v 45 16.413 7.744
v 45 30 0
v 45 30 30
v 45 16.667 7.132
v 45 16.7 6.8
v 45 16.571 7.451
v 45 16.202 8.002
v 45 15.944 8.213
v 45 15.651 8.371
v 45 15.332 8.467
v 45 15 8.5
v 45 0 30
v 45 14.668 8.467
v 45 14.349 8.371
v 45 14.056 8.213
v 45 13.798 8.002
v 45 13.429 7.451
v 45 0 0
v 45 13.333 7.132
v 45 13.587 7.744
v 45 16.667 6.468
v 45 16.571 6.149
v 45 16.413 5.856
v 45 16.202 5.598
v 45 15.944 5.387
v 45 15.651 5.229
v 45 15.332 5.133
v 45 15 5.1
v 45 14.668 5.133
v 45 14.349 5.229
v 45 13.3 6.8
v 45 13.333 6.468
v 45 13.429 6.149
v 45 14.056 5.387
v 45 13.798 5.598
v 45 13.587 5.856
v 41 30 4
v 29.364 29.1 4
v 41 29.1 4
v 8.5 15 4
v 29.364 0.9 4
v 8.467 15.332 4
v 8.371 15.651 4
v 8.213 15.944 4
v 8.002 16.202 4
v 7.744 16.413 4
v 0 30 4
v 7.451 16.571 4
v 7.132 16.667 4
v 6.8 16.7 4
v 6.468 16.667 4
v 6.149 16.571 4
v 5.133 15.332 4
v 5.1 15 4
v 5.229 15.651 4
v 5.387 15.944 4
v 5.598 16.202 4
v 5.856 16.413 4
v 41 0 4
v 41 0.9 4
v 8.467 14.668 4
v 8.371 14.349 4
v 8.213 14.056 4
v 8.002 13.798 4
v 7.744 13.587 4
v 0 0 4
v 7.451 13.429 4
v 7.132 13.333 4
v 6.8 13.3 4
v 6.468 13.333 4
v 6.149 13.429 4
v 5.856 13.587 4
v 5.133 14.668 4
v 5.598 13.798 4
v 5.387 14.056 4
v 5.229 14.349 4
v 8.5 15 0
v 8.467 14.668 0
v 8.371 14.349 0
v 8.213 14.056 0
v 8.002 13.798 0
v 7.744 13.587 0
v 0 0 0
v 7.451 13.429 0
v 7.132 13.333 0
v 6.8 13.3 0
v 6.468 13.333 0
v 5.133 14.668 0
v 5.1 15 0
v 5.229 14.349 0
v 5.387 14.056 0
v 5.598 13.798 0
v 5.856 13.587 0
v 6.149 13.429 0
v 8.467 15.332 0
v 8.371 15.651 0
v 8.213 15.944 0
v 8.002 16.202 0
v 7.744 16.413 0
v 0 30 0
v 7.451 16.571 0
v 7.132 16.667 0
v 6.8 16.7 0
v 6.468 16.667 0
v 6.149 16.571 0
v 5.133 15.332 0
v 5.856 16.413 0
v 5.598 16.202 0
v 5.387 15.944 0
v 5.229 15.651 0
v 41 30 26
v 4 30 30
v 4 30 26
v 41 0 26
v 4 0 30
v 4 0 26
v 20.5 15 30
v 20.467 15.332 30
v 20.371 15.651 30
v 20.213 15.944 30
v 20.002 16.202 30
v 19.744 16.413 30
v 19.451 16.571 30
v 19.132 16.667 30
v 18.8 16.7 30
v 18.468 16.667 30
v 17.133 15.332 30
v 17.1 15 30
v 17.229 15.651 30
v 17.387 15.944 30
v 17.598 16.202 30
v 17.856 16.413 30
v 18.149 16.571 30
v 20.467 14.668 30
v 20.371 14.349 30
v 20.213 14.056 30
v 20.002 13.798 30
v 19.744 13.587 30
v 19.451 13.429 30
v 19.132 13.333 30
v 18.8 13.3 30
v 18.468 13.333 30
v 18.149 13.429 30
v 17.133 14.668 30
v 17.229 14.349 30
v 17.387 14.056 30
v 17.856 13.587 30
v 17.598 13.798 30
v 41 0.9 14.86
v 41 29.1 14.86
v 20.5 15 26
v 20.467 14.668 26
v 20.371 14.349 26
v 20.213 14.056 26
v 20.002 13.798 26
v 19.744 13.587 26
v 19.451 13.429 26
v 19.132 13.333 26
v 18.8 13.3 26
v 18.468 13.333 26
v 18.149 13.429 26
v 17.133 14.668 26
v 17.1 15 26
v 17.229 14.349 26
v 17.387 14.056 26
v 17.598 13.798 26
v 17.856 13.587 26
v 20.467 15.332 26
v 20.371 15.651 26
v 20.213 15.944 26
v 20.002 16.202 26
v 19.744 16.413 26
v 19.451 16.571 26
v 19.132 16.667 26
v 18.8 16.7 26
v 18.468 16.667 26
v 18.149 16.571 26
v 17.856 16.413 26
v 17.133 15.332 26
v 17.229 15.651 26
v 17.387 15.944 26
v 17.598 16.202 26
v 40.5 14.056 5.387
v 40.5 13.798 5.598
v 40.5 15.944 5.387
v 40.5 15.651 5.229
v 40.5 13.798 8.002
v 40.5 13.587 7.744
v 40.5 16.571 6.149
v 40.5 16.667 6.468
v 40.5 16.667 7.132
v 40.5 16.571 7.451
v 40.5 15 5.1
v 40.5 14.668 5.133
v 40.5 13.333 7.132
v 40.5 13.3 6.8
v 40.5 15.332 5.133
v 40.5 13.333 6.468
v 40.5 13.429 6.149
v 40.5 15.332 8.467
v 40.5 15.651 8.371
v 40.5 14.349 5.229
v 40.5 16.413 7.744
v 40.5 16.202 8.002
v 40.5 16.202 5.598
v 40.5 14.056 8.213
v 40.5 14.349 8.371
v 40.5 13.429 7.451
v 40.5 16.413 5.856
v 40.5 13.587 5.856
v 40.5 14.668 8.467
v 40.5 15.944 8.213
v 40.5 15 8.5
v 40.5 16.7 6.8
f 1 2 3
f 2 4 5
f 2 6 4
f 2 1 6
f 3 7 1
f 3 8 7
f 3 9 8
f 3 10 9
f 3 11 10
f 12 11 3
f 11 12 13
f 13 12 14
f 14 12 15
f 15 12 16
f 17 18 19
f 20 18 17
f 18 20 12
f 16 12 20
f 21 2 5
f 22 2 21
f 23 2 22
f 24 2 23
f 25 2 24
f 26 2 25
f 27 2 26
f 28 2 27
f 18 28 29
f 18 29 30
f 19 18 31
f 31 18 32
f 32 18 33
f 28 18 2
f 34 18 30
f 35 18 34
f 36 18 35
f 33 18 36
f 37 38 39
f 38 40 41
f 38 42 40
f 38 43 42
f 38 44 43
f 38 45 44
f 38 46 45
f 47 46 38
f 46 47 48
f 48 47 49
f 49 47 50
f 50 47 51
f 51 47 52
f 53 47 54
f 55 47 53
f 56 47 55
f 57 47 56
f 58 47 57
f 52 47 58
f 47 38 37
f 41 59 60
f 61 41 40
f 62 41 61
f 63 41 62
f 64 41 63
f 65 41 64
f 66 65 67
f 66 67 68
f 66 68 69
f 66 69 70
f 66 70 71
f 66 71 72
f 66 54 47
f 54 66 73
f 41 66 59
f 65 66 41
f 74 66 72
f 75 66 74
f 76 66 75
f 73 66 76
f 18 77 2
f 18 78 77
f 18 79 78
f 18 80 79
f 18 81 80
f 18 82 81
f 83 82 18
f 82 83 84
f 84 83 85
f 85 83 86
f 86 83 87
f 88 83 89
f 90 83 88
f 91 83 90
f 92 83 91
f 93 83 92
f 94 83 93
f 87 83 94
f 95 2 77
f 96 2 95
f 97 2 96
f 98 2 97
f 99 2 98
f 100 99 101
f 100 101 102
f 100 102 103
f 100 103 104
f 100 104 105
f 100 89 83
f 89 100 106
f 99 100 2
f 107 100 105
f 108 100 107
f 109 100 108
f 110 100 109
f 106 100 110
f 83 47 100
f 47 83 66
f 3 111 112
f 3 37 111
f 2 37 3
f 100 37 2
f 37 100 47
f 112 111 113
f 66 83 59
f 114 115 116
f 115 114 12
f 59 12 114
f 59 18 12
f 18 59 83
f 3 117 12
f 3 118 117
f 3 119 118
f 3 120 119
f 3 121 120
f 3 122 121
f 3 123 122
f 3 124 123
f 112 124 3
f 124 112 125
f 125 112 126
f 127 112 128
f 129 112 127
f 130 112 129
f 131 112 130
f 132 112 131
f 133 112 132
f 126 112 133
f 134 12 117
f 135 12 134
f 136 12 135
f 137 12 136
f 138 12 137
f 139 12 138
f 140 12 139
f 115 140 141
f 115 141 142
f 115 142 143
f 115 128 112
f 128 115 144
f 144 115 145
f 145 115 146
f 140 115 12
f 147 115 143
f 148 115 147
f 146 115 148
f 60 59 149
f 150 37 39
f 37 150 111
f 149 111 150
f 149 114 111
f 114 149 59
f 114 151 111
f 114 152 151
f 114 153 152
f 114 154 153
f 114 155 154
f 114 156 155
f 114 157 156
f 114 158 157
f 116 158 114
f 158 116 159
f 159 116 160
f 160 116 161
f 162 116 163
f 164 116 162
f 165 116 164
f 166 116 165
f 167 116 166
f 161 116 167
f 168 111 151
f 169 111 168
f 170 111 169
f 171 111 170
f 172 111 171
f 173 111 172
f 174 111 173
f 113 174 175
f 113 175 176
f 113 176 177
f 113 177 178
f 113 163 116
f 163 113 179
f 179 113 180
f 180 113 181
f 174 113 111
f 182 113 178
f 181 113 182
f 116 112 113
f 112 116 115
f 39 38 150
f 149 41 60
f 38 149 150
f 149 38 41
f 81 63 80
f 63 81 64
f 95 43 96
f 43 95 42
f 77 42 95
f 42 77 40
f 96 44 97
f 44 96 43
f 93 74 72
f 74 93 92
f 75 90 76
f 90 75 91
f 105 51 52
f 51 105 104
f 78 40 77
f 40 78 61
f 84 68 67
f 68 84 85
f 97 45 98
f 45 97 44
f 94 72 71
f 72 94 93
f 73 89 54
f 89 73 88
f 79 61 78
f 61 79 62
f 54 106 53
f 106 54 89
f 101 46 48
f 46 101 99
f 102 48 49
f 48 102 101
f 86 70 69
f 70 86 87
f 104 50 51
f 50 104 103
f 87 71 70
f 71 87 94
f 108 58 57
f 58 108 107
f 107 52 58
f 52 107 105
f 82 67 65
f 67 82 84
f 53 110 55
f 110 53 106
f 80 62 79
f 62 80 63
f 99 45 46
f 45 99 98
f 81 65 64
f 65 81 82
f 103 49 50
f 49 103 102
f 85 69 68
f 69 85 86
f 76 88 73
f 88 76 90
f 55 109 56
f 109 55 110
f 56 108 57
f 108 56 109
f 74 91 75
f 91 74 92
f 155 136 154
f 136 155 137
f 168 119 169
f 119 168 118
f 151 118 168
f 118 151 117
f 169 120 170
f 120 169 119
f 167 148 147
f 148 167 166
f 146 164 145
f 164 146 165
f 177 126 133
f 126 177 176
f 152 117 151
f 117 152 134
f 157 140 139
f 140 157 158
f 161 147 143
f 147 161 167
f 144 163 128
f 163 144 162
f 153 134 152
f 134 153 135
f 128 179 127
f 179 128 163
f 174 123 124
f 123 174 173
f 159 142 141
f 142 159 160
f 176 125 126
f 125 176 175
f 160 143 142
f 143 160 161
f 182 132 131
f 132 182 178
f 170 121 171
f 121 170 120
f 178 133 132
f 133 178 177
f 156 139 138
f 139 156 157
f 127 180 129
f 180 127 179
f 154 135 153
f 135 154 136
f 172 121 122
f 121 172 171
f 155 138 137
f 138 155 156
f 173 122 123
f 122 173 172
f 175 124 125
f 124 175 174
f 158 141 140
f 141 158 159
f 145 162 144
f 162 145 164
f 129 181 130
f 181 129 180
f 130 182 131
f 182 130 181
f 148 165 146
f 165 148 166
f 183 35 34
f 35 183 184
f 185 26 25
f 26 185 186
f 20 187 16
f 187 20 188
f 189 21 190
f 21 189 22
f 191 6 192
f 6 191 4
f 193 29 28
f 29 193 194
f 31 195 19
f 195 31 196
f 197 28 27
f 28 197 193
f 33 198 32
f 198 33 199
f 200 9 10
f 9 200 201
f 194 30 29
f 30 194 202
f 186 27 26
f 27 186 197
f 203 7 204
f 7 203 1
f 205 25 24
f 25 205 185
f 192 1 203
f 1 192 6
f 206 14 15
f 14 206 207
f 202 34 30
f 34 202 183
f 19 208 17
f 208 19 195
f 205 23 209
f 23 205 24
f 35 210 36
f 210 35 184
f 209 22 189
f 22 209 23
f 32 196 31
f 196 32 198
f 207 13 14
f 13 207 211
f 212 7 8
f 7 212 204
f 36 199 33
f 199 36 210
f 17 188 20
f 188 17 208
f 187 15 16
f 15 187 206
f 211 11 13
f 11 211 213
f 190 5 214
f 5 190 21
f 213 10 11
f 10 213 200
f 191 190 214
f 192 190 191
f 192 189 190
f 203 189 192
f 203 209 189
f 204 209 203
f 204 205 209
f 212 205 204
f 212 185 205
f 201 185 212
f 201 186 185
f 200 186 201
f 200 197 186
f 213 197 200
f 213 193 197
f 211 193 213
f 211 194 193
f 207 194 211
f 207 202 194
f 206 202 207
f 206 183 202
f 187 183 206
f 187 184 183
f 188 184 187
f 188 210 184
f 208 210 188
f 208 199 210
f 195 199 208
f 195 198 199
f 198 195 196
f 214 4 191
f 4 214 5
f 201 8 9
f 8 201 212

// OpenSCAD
$fn = 32;

// ----------------------------------------------------------------------
// Z-bracket: 45 x 30 x 30 mm
// ----------------------------------------------------------------------

// --- parameters (mm) ---
lower_leg = 45;           // lower foot length, X
upper_leg = 37;           // upper foot length, X
bracket_w = 30;           // bracket width, Y
offset_h = 30;            // overall rise, Z
sheet_t = 4;              // plate thickness
hole_d = 3.4;             // clearance for M3
rib_len = 12.6;           // gusset leg
rib_sink = 0.9;           // gusset overlap into the plates

module hole_z(px, py, z0) {
  translate([px, py, z0 - 0.5]) cylinder(h = sheet_t + 1, d = hole_d);
}
module hole_x(py, pz) {
  translate([-0.5, py, pz]) rotate([0, 90, 0]) cylinder(h = sheet_t + 1, d = hole_d);
}
module gusset(x0) {
  translate([x0, bracket_w - rib_sink, 0])
    rotate([90, 0, 0])
      linear_extrude(height = bracket_w - 2 * rib_sink)
        polygon(points = [[rib_sink, sheet_t - rib_sink],
                          [rib_sink, sheet_t - rib_sink + rib_len],
                          [-rib_len, sheet_t - rib_sink]]);
}

difference() {
  union() {
    cube([lower_leg, bracket_w, sheet_t]);
    /* web, overlapping the lower foot */
    translate([lower_leg - sheet_t, 0, 0]) cube([sheet_t, bracket_w, offset_h]);
    /* upper foot, sunk into the web */
    translate([lower_leg - sheet_t - upper_leg, 0, offset_h - sheet_t]) cube([upper_leg + sheet_t, bracket_w, sheet_t]);
    gusset(lower_leg - sheet_t);
  }
  hole_z(6.8, 15, 0);
  translate([lower_leg - sheet_t - 22.2, 0, 0]) hole_z(0, 15, offset_h - sheet_t);
  translate([lower_leg - sheet_t, 0, 0]) hole_x(15, 6.8);
}
